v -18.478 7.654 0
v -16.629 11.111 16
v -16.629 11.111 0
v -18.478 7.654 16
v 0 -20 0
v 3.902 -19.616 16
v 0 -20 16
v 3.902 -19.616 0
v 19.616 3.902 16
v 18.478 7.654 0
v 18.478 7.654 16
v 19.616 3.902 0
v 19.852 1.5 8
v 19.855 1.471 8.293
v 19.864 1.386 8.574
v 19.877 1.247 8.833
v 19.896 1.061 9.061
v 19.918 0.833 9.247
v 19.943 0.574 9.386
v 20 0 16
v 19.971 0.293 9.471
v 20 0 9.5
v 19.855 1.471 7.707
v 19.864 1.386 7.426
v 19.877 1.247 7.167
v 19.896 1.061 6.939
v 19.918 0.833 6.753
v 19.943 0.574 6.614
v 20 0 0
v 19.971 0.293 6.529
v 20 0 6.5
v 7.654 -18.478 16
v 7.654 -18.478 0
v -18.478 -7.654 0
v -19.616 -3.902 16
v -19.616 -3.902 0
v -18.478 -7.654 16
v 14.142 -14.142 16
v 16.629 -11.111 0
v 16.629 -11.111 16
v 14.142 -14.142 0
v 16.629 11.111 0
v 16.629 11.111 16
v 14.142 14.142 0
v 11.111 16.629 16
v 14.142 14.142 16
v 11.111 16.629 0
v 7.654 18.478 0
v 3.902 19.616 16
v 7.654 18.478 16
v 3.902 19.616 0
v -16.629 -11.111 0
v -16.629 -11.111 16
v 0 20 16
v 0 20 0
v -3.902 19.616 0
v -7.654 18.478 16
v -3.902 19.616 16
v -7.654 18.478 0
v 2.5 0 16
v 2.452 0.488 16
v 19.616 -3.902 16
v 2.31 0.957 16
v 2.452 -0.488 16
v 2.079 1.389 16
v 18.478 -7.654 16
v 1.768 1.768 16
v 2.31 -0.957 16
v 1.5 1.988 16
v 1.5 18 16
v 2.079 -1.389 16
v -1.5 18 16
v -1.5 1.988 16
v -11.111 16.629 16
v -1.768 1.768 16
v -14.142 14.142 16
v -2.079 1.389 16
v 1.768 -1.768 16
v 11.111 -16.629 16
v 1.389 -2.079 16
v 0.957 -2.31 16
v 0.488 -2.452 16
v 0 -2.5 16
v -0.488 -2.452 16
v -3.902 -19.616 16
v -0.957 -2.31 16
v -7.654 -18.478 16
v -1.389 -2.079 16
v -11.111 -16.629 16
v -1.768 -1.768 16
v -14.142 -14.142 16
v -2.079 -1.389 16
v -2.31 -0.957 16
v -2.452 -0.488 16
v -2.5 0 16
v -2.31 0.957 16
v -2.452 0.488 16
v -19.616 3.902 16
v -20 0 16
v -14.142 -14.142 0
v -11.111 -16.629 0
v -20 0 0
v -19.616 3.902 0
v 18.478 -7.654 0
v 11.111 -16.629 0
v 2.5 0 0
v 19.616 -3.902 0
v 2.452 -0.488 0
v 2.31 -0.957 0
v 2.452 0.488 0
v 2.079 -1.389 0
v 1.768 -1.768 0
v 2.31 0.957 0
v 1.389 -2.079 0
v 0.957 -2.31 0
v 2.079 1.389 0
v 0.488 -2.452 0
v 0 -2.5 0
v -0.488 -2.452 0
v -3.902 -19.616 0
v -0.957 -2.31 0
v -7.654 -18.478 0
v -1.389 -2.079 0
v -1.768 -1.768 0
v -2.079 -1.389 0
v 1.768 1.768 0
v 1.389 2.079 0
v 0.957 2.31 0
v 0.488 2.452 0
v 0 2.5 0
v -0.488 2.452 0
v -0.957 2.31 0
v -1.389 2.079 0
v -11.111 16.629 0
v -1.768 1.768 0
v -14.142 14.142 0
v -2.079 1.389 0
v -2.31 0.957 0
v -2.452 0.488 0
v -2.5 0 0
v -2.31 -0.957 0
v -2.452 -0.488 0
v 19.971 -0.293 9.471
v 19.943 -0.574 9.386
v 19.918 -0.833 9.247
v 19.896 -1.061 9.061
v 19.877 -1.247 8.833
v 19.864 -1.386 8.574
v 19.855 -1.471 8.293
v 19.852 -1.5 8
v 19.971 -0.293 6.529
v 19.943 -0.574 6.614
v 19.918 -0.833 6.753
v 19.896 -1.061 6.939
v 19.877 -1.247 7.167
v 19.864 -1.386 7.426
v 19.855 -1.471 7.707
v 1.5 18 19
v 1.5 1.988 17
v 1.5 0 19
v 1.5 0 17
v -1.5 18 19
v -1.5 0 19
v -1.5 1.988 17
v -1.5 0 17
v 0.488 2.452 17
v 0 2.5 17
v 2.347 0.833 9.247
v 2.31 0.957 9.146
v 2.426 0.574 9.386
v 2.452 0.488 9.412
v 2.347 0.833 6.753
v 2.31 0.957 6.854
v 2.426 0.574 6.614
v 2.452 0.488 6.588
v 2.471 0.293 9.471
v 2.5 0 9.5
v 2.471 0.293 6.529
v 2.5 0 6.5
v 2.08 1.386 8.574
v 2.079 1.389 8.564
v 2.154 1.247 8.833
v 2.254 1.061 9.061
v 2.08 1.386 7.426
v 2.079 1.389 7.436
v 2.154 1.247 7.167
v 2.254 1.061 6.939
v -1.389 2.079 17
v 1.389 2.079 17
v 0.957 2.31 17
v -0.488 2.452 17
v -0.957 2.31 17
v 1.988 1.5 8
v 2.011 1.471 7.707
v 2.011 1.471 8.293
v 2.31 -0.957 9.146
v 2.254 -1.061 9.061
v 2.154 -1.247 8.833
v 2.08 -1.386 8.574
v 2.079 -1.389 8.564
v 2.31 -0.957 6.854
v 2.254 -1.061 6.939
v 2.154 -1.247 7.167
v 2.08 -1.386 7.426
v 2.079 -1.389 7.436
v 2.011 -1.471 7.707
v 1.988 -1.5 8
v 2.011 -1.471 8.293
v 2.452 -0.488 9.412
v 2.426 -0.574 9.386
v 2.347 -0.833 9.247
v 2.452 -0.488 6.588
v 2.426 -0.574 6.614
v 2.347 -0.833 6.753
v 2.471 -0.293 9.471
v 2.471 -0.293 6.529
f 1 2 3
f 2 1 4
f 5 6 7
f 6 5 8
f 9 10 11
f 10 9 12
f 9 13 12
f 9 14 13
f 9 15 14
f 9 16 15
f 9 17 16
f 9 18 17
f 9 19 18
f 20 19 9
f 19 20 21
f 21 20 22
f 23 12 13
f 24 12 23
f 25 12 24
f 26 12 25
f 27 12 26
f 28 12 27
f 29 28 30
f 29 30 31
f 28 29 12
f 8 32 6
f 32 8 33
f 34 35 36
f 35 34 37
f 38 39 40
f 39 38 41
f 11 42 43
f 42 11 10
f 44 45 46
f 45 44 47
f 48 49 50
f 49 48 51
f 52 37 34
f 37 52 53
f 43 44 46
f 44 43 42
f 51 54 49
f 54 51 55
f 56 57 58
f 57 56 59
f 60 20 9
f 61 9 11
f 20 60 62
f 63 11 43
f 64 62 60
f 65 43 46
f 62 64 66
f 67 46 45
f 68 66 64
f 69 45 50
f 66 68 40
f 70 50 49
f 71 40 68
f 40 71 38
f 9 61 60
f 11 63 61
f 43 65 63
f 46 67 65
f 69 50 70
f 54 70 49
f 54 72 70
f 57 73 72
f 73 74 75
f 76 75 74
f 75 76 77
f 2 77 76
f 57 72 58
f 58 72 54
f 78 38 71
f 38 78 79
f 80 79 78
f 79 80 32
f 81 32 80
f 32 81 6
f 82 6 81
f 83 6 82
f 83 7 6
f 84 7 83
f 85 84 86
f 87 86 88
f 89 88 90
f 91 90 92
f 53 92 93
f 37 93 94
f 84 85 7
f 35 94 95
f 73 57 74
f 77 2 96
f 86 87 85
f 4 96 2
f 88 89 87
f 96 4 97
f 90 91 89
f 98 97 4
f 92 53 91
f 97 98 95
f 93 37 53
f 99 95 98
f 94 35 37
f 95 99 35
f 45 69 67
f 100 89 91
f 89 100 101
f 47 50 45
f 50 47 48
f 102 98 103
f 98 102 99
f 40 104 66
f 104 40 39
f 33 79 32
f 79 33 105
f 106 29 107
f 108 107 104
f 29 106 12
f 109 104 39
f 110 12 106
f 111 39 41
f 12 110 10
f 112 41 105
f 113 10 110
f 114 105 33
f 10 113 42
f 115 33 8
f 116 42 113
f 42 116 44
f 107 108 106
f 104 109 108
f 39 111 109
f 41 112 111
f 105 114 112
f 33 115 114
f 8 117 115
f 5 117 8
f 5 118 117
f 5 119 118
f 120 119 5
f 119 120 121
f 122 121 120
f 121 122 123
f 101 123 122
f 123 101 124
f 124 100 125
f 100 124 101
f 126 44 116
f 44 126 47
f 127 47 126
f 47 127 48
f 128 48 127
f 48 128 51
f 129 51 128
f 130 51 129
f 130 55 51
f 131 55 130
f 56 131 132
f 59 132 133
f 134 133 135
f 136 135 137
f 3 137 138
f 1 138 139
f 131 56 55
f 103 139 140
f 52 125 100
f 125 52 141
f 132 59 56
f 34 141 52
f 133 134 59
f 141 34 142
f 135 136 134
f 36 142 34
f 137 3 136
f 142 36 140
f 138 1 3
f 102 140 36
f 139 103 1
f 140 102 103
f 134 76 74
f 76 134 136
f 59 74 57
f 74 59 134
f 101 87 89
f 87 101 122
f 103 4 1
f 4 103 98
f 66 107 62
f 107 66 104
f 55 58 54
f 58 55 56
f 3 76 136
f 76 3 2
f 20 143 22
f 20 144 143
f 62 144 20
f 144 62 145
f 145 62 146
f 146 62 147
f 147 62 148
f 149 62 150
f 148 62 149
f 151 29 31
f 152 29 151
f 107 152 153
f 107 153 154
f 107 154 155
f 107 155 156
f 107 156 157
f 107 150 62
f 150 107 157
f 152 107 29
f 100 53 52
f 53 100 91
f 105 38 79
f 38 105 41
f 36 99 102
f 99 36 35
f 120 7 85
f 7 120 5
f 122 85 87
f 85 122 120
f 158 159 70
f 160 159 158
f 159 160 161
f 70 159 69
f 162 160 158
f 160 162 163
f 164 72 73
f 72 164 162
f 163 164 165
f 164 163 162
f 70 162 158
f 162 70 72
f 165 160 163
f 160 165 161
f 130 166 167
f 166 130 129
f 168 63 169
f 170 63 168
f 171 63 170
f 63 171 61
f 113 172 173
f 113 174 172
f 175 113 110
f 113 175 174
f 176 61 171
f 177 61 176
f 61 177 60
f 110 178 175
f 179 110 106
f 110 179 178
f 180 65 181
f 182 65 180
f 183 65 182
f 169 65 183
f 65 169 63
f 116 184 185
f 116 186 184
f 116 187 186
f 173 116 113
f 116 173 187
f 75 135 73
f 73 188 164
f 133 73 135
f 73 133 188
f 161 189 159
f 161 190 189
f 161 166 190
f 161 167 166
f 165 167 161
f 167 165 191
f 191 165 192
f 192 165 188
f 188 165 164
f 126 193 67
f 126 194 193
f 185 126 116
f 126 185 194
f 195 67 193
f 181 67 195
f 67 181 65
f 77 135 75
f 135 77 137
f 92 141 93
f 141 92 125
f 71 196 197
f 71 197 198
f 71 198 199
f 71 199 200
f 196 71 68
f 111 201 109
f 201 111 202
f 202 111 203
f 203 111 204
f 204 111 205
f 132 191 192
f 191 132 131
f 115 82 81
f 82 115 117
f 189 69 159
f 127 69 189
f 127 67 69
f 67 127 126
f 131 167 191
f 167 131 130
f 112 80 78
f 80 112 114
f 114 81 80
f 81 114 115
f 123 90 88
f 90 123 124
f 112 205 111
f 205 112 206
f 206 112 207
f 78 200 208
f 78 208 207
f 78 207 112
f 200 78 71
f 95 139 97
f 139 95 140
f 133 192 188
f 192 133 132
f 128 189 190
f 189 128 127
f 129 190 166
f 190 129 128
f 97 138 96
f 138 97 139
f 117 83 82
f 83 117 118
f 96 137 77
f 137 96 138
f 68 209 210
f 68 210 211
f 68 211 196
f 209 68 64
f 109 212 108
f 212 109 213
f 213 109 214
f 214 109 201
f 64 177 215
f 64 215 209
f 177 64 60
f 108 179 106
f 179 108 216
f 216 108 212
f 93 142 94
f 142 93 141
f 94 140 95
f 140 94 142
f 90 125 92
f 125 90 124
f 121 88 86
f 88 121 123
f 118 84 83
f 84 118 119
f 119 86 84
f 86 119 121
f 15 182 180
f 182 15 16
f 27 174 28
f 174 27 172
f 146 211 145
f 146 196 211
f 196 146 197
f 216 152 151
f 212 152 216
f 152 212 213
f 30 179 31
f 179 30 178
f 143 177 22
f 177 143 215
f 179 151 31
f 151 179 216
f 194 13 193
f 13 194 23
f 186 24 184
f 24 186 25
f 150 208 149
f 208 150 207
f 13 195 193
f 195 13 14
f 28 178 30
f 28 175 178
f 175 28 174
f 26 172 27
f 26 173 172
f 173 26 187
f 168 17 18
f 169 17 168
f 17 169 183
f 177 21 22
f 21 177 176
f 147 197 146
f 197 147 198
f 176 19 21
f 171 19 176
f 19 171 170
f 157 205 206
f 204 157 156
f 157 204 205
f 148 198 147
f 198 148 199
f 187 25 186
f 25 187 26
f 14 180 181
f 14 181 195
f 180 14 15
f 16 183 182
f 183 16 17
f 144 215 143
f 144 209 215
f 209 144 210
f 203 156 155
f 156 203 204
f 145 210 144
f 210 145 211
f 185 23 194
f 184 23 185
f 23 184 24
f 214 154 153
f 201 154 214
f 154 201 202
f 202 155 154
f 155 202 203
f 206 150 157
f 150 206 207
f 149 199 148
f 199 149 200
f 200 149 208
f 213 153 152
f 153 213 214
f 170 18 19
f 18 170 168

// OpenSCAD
$fn = 32;

// ----------------------------------------------------------------------
// Control knob: pointer knob
// ----------------------------------------------------------------------

// --- parameters (mm) ---
rib_w = 3;                // pointer rib width
rib_h = 4;                // pointer rib height
knob_d = 40;              // knob body diameter
knob_h = 16;              // knob body height
bore_d = 5;               // shaft bore diameter
set_d = 3;                // set screw bore diameter
fit_tol = 0.02;           // tolerance for press fits, mm
free_tol = 0.2;           // tolerance for clearance fits, mm

rib_poke = rib_h - 1;  // rib height above the top
total_h = knob_h + rib_h - 1;  // overall height

difference() {
  union() {
    cylinder(h = knob_h, d = knob_d);
    translate([-rib_w / 2, 0, knob_h - 1])
      cube([rib_w, knob_d / 2 - 2, rib_h]);
  }
  translate([0, 0, -1]) cylinder(h = knob_h + 2, d = bore_d);
  translate([-1, 0, knob_h / 2]) rotate([0, 90, 0])
    cylinder(h = knob_d / 2 + bore_d / 2 + 2, d = set_d);}
